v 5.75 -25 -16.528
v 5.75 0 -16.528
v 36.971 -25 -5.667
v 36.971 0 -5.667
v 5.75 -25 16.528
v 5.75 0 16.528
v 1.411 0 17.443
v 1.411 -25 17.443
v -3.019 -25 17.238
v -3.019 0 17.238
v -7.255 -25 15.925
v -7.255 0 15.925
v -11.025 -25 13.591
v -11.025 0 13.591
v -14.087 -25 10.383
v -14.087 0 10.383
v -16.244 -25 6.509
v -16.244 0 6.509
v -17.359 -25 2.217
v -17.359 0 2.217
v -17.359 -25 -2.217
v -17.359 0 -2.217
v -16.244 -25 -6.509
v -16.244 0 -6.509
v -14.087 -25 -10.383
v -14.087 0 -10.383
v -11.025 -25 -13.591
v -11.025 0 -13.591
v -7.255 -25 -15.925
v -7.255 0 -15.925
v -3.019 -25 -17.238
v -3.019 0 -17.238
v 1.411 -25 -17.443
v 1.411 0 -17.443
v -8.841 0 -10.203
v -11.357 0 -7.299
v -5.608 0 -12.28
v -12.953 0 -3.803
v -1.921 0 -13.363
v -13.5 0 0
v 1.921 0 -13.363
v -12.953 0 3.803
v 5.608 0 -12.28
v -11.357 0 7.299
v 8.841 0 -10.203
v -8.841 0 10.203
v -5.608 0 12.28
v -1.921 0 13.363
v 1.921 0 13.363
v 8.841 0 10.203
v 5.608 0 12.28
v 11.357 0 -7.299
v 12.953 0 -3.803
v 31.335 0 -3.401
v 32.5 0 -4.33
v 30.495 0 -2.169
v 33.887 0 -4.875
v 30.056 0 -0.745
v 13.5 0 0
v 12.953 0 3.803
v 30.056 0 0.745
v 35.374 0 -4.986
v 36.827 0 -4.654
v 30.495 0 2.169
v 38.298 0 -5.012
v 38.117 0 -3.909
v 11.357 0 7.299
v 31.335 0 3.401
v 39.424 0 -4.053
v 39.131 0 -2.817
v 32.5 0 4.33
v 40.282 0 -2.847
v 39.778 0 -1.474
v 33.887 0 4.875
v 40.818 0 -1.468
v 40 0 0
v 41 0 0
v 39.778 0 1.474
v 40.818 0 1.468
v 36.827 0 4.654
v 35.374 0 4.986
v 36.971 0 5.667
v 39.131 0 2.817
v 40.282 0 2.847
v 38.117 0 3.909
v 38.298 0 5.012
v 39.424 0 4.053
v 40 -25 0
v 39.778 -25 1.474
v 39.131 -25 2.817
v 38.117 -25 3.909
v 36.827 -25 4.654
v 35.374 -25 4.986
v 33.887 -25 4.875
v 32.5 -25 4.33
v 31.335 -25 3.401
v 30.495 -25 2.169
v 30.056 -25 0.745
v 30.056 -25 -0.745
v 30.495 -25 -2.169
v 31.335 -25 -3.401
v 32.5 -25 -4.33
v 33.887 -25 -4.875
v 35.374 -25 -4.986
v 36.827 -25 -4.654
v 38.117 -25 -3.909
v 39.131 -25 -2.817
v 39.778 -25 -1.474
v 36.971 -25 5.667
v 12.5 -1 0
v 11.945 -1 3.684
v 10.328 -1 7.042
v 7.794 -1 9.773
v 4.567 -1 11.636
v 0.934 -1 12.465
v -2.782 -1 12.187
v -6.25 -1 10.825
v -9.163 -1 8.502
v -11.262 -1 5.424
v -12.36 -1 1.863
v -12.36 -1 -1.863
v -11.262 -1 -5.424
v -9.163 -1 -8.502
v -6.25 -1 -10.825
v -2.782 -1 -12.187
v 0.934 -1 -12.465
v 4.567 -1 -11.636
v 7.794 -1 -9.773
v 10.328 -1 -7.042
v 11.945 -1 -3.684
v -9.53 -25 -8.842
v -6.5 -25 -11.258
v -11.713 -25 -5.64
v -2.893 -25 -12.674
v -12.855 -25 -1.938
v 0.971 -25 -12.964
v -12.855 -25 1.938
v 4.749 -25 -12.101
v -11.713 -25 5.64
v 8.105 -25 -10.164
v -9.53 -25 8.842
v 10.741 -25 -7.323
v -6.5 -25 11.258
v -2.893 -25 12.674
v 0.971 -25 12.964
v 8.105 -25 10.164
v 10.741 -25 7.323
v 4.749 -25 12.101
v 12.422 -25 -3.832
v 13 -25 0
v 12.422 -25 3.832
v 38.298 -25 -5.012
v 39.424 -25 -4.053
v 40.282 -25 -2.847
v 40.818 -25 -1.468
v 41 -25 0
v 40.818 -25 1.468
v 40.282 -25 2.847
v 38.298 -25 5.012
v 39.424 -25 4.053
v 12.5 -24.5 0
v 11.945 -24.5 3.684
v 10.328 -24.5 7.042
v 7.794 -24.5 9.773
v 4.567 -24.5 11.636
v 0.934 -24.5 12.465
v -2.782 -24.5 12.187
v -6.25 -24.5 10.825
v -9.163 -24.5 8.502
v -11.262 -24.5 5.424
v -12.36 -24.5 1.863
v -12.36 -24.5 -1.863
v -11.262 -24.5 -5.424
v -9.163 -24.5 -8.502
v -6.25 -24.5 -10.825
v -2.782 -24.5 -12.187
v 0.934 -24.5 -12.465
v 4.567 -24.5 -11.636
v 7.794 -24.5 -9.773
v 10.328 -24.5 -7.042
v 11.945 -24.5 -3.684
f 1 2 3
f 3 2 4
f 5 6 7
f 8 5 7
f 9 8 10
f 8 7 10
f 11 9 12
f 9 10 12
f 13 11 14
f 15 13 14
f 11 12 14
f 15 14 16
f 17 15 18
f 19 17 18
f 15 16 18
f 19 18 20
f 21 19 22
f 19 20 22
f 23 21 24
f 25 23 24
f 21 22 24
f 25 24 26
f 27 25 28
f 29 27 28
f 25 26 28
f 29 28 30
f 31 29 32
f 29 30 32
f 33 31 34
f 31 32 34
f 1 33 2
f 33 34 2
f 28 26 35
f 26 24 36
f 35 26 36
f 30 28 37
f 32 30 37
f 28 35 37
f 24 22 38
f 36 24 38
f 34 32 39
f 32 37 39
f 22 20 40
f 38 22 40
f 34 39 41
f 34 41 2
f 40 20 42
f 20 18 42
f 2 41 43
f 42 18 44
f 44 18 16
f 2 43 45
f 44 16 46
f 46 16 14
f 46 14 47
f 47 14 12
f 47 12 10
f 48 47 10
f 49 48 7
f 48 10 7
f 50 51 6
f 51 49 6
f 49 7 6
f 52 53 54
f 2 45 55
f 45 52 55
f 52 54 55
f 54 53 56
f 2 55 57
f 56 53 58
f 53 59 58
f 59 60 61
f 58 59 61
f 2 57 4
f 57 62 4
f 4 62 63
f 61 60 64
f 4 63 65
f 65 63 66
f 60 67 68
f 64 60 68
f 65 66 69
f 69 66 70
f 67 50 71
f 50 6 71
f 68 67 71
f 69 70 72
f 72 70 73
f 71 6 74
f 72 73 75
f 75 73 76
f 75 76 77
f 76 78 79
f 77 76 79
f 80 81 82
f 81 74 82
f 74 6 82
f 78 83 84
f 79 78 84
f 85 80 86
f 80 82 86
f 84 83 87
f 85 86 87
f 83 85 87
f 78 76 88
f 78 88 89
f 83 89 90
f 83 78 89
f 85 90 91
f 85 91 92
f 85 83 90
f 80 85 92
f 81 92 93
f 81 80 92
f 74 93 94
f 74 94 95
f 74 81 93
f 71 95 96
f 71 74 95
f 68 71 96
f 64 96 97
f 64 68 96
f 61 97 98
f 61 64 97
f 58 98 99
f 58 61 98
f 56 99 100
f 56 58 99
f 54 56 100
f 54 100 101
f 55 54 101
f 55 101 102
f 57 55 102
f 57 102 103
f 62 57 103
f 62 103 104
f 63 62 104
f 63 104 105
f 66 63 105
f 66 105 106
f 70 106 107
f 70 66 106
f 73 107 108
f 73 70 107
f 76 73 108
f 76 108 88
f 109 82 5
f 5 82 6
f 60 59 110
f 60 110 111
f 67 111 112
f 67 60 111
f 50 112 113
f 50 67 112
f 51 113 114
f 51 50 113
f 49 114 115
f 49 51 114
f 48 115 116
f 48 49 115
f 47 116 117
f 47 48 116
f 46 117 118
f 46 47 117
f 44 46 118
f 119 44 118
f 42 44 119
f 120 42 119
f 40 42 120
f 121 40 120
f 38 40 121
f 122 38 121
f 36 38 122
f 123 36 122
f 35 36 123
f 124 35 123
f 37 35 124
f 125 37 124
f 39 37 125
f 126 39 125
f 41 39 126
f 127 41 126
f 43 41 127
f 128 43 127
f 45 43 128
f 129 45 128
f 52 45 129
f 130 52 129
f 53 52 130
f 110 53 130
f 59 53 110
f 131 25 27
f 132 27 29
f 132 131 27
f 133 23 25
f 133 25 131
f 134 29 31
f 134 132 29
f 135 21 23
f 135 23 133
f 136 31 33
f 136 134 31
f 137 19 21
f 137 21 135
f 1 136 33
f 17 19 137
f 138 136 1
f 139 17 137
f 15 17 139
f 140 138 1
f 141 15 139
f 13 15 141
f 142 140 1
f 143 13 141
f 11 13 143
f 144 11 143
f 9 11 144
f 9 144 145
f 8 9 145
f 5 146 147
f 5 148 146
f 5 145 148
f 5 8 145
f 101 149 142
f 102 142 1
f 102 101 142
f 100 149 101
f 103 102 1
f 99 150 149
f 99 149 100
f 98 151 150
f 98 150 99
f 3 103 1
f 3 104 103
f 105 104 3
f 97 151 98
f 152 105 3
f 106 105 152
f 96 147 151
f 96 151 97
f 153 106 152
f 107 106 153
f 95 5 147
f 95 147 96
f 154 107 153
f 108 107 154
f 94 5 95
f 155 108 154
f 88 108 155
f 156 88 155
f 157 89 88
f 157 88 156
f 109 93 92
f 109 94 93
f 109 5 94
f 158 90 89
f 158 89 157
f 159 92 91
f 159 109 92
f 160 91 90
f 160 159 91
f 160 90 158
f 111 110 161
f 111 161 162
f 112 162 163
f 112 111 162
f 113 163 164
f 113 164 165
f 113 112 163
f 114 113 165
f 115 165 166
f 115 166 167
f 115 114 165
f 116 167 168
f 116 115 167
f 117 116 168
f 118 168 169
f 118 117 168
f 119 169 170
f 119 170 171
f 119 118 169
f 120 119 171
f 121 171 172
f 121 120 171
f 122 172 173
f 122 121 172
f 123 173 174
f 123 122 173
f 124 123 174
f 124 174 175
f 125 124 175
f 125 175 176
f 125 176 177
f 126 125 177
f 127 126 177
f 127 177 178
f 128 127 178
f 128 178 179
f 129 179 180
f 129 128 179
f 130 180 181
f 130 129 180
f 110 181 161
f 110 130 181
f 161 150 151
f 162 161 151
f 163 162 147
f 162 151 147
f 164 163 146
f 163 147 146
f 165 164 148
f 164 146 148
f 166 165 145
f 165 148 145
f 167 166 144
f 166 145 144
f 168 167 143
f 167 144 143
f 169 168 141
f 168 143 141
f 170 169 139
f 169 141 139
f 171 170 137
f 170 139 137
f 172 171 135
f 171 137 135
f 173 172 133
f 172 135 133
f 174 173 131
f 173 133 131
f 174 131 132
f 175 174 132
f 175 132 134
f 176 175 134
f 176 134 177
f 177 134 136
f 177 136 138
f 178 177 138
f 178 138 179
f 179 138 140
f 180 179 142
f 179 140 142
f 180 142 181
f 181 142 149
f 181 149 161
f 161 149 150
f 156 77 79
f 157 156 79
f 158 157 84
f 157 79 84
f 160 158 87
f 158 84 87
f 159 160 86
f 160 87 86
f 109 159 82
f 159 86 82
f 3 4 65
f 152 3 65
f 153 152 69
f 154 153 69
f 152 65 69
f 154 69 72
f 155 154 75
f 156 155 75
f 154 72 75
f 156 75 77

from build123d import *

# Parameters (mm, degrees)
F0_R     = 12.5
F0_R_2   = 5
F3_DEPTH = 25
F1_SIZE  = 0.5
F2_SIZE  = 1


with BuildPart() as f3:
    # F0 (on Front) → F3 (new body)
    with BuildSketch(Plane.XZ):
        with BuildLine():
            ThreePointArc((5.75, -16.528385), (14.263152, -10.13965), (17.5, 0))
            ThreePointArc((17.5, 0), (14.263152, 10.13965), (5.75, 16.528385))
            ThreePointArc((5.75, 16.528385), (-17.5, 0), (5.75, -16.528385))
        make_face()
        Circle(F0_R, mode=Mode.SUBTRACT)
        with BuildLine():
            ThreePointArc((5.75, 16.528385), (14.263152, 10.13965), (17.5, 0))
            ThreePointArc((17.5, 0), (14.263152, -10.13965), (5.75, -16.528385))
            Line((5.75, -16.528385), (36.971429, -5.666875))
            ThreePointArc((36.971429, -5.666875), (29, 0), (36.971429, 5.666875))
            Line((36.971429, 5.666875), (5.75, 16.528385))
        make_face()
        with BuildLine():
            ThreePointArc((41, 0), (39.890223, 3.476451), (36.971429, 5.666875))
            ThreePointArc((36.971429, 5.666875), (29, 0), (36.971429, -5.666875))
            ThreePointArc((36.971429, -5.666875), (39.890223, -3.476451), (41, 0))
        make_face()
        with Locations((35, 0)):
            Circle(F0_R_2, mode=Mode.SUBTRACT)
    extrude(amount=F3_DEPTH)

    # F1
    f1_edges = [f3.edges().sort_by_distance(p)[0] for p in [
        (-12.5, -25, 0),
    ]]
    chamfer(f1_edges, length=F1_SIZE)

    # F2
    f2_edges = [f3.edges().sort_by_distance(p)[0] for p in [
        (-12.5, 0, 0),
    ]]
    chamfer(f2_edges, length=F2_SIZE)


solid = f3.part
